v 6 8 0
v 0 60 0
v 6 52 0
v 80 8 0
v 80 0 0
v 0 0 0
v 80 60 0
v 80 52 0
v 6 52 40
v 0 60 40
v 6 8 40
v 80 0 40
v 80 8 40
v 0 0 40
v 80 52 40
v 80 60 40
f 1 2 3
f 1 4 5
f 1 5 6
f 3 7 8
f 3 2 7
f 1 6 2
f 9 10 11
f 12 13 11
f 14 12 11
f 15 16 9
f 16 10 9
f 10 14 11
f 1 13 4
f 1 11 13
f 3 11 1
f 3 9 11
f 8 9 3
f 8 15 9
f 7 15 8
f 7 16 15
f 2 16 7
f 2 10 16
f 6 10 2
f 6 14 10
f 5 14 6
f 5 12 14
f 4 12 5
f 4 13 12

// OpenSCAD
$fn = 32;

// ----------------------------------------------------------------------
// Structural section: channel 80 x 60 mm
// ----------------------------------------------------------------------

// --- parameters (mm) ---
sec_w = 80;               // channel width, X
sec_h = 60;               // channel height, Y
flange_t = 8;             // flange thickness
web_t = 6;                // web thickness
plate_t = 40;             // cut length, Z (extrusion height)

profile = [[0, 0], [80, 0], [80, 8], [6, 8], [6, 52], [80, 52], [80, 60], [0, 60]];  // primary outline, 8 points, counter clockwise

// --- the one profile operation ---
linear_extrude(height = plate_t) polygon(points = profile);
